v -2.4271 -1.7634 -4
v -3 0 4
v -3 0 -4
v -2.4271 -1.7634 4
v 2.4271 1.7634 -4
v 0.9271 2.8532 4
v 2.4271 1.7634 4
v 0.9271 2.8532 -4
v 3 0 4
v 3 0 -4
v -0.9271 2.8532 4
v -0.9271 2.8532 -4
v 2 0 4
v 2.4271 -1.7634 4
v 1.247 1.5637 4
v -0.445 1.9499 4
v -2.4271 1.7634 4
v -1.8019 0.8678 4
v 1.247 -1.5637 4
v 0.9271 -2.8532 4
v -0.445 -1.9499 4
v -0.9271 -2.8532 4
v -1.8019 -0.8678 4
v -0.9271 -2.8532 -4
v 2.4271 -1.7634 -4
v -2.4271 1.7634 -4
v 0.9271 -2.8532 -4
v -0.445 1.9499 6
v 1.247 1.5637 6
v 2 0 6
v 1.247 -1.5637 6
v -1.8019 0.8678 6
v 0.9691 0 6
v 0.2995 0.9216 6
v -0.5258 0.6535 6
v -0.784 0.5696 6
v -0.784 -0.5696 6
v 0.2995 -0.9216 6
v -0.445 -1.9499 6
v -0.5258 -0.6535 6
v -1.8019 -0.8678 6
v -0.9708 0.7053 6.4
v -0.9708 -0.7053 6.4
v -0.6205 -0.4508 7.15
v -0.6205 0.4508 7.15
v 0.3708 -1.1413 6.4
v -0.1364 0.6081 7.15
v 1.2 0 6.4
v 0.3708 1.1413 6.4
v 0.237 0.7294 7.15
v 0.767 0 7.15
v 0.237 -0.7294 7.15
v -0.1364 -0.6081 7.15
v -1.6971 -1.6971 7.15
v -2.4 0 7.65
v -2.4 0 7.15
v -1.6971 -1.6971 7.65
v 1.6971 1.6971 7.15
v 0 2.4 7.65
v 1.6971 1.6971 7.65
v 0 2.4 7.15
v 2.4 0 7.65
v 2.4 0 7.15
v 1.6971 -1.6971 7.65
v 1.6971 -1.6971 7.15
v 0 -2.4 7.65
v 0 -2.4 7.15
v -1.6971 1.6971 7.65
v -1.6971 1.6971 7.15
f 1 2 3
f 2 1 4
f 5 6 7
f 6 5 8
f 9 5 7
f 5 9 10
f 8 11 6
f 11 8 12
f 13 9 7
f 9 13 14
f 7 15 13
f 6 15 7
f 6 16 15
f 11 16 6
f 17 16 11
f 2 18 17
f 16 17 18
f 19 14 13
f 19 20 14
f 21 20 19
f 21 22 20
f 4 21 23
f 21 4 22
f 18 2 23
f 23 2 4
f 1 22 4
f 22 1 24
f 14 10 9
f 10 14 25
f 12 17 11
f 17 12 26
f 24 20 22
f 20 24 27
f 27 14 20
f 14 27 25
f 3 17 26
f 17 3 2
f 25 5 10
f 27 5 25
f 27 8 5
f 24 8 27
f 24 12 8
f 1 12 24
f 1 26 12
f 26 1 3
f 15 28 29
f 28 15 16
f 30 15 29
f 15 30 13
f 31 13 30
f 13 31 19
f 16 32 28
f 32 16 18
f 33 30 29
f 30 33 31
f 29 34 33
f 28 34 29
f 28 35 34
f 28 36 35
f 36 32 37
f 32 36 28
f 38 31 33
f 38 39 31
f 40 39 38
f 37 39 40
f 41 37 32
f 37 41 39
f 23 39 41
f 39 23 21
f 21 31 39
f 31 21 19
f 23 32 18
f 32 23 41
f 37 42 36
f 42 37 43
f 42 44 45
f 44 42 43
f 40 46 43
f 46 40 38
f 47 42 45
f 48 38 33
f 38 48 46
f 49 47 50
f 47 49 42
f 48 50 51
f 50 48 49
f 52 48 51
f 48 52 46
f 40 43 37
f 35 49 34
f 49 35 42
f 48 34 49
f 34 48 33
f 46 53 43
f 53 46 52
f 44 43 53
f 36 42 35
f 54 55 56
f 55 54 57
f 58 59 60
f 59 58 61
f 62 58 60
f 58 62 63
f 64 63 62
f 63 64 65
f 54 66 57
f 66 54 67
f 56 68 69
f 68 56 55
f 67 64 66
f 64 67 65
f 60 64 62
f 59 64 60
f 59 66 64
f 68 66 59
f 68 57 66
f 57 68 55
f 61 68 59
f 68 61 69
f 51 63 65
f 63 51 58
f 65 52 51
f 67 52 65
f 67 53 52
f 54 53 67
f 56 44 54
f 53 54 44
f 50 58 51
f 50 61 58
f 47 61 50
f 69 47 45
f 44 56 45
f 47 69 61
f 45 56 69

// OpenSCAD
module lighthouse_beacon() {
  union() {
    cylinder(h=8, r=3, center=true);
    translate([0,0,5])
      cylinder(h=2, r=2, center=true);
    translate([0,0,6.4])
      sphere(r=1.2);
    translate([0,0,7.4])
      cylinder(h=0.5, r=2.4, center=true);
  }
}

lighthouse_beacon();
